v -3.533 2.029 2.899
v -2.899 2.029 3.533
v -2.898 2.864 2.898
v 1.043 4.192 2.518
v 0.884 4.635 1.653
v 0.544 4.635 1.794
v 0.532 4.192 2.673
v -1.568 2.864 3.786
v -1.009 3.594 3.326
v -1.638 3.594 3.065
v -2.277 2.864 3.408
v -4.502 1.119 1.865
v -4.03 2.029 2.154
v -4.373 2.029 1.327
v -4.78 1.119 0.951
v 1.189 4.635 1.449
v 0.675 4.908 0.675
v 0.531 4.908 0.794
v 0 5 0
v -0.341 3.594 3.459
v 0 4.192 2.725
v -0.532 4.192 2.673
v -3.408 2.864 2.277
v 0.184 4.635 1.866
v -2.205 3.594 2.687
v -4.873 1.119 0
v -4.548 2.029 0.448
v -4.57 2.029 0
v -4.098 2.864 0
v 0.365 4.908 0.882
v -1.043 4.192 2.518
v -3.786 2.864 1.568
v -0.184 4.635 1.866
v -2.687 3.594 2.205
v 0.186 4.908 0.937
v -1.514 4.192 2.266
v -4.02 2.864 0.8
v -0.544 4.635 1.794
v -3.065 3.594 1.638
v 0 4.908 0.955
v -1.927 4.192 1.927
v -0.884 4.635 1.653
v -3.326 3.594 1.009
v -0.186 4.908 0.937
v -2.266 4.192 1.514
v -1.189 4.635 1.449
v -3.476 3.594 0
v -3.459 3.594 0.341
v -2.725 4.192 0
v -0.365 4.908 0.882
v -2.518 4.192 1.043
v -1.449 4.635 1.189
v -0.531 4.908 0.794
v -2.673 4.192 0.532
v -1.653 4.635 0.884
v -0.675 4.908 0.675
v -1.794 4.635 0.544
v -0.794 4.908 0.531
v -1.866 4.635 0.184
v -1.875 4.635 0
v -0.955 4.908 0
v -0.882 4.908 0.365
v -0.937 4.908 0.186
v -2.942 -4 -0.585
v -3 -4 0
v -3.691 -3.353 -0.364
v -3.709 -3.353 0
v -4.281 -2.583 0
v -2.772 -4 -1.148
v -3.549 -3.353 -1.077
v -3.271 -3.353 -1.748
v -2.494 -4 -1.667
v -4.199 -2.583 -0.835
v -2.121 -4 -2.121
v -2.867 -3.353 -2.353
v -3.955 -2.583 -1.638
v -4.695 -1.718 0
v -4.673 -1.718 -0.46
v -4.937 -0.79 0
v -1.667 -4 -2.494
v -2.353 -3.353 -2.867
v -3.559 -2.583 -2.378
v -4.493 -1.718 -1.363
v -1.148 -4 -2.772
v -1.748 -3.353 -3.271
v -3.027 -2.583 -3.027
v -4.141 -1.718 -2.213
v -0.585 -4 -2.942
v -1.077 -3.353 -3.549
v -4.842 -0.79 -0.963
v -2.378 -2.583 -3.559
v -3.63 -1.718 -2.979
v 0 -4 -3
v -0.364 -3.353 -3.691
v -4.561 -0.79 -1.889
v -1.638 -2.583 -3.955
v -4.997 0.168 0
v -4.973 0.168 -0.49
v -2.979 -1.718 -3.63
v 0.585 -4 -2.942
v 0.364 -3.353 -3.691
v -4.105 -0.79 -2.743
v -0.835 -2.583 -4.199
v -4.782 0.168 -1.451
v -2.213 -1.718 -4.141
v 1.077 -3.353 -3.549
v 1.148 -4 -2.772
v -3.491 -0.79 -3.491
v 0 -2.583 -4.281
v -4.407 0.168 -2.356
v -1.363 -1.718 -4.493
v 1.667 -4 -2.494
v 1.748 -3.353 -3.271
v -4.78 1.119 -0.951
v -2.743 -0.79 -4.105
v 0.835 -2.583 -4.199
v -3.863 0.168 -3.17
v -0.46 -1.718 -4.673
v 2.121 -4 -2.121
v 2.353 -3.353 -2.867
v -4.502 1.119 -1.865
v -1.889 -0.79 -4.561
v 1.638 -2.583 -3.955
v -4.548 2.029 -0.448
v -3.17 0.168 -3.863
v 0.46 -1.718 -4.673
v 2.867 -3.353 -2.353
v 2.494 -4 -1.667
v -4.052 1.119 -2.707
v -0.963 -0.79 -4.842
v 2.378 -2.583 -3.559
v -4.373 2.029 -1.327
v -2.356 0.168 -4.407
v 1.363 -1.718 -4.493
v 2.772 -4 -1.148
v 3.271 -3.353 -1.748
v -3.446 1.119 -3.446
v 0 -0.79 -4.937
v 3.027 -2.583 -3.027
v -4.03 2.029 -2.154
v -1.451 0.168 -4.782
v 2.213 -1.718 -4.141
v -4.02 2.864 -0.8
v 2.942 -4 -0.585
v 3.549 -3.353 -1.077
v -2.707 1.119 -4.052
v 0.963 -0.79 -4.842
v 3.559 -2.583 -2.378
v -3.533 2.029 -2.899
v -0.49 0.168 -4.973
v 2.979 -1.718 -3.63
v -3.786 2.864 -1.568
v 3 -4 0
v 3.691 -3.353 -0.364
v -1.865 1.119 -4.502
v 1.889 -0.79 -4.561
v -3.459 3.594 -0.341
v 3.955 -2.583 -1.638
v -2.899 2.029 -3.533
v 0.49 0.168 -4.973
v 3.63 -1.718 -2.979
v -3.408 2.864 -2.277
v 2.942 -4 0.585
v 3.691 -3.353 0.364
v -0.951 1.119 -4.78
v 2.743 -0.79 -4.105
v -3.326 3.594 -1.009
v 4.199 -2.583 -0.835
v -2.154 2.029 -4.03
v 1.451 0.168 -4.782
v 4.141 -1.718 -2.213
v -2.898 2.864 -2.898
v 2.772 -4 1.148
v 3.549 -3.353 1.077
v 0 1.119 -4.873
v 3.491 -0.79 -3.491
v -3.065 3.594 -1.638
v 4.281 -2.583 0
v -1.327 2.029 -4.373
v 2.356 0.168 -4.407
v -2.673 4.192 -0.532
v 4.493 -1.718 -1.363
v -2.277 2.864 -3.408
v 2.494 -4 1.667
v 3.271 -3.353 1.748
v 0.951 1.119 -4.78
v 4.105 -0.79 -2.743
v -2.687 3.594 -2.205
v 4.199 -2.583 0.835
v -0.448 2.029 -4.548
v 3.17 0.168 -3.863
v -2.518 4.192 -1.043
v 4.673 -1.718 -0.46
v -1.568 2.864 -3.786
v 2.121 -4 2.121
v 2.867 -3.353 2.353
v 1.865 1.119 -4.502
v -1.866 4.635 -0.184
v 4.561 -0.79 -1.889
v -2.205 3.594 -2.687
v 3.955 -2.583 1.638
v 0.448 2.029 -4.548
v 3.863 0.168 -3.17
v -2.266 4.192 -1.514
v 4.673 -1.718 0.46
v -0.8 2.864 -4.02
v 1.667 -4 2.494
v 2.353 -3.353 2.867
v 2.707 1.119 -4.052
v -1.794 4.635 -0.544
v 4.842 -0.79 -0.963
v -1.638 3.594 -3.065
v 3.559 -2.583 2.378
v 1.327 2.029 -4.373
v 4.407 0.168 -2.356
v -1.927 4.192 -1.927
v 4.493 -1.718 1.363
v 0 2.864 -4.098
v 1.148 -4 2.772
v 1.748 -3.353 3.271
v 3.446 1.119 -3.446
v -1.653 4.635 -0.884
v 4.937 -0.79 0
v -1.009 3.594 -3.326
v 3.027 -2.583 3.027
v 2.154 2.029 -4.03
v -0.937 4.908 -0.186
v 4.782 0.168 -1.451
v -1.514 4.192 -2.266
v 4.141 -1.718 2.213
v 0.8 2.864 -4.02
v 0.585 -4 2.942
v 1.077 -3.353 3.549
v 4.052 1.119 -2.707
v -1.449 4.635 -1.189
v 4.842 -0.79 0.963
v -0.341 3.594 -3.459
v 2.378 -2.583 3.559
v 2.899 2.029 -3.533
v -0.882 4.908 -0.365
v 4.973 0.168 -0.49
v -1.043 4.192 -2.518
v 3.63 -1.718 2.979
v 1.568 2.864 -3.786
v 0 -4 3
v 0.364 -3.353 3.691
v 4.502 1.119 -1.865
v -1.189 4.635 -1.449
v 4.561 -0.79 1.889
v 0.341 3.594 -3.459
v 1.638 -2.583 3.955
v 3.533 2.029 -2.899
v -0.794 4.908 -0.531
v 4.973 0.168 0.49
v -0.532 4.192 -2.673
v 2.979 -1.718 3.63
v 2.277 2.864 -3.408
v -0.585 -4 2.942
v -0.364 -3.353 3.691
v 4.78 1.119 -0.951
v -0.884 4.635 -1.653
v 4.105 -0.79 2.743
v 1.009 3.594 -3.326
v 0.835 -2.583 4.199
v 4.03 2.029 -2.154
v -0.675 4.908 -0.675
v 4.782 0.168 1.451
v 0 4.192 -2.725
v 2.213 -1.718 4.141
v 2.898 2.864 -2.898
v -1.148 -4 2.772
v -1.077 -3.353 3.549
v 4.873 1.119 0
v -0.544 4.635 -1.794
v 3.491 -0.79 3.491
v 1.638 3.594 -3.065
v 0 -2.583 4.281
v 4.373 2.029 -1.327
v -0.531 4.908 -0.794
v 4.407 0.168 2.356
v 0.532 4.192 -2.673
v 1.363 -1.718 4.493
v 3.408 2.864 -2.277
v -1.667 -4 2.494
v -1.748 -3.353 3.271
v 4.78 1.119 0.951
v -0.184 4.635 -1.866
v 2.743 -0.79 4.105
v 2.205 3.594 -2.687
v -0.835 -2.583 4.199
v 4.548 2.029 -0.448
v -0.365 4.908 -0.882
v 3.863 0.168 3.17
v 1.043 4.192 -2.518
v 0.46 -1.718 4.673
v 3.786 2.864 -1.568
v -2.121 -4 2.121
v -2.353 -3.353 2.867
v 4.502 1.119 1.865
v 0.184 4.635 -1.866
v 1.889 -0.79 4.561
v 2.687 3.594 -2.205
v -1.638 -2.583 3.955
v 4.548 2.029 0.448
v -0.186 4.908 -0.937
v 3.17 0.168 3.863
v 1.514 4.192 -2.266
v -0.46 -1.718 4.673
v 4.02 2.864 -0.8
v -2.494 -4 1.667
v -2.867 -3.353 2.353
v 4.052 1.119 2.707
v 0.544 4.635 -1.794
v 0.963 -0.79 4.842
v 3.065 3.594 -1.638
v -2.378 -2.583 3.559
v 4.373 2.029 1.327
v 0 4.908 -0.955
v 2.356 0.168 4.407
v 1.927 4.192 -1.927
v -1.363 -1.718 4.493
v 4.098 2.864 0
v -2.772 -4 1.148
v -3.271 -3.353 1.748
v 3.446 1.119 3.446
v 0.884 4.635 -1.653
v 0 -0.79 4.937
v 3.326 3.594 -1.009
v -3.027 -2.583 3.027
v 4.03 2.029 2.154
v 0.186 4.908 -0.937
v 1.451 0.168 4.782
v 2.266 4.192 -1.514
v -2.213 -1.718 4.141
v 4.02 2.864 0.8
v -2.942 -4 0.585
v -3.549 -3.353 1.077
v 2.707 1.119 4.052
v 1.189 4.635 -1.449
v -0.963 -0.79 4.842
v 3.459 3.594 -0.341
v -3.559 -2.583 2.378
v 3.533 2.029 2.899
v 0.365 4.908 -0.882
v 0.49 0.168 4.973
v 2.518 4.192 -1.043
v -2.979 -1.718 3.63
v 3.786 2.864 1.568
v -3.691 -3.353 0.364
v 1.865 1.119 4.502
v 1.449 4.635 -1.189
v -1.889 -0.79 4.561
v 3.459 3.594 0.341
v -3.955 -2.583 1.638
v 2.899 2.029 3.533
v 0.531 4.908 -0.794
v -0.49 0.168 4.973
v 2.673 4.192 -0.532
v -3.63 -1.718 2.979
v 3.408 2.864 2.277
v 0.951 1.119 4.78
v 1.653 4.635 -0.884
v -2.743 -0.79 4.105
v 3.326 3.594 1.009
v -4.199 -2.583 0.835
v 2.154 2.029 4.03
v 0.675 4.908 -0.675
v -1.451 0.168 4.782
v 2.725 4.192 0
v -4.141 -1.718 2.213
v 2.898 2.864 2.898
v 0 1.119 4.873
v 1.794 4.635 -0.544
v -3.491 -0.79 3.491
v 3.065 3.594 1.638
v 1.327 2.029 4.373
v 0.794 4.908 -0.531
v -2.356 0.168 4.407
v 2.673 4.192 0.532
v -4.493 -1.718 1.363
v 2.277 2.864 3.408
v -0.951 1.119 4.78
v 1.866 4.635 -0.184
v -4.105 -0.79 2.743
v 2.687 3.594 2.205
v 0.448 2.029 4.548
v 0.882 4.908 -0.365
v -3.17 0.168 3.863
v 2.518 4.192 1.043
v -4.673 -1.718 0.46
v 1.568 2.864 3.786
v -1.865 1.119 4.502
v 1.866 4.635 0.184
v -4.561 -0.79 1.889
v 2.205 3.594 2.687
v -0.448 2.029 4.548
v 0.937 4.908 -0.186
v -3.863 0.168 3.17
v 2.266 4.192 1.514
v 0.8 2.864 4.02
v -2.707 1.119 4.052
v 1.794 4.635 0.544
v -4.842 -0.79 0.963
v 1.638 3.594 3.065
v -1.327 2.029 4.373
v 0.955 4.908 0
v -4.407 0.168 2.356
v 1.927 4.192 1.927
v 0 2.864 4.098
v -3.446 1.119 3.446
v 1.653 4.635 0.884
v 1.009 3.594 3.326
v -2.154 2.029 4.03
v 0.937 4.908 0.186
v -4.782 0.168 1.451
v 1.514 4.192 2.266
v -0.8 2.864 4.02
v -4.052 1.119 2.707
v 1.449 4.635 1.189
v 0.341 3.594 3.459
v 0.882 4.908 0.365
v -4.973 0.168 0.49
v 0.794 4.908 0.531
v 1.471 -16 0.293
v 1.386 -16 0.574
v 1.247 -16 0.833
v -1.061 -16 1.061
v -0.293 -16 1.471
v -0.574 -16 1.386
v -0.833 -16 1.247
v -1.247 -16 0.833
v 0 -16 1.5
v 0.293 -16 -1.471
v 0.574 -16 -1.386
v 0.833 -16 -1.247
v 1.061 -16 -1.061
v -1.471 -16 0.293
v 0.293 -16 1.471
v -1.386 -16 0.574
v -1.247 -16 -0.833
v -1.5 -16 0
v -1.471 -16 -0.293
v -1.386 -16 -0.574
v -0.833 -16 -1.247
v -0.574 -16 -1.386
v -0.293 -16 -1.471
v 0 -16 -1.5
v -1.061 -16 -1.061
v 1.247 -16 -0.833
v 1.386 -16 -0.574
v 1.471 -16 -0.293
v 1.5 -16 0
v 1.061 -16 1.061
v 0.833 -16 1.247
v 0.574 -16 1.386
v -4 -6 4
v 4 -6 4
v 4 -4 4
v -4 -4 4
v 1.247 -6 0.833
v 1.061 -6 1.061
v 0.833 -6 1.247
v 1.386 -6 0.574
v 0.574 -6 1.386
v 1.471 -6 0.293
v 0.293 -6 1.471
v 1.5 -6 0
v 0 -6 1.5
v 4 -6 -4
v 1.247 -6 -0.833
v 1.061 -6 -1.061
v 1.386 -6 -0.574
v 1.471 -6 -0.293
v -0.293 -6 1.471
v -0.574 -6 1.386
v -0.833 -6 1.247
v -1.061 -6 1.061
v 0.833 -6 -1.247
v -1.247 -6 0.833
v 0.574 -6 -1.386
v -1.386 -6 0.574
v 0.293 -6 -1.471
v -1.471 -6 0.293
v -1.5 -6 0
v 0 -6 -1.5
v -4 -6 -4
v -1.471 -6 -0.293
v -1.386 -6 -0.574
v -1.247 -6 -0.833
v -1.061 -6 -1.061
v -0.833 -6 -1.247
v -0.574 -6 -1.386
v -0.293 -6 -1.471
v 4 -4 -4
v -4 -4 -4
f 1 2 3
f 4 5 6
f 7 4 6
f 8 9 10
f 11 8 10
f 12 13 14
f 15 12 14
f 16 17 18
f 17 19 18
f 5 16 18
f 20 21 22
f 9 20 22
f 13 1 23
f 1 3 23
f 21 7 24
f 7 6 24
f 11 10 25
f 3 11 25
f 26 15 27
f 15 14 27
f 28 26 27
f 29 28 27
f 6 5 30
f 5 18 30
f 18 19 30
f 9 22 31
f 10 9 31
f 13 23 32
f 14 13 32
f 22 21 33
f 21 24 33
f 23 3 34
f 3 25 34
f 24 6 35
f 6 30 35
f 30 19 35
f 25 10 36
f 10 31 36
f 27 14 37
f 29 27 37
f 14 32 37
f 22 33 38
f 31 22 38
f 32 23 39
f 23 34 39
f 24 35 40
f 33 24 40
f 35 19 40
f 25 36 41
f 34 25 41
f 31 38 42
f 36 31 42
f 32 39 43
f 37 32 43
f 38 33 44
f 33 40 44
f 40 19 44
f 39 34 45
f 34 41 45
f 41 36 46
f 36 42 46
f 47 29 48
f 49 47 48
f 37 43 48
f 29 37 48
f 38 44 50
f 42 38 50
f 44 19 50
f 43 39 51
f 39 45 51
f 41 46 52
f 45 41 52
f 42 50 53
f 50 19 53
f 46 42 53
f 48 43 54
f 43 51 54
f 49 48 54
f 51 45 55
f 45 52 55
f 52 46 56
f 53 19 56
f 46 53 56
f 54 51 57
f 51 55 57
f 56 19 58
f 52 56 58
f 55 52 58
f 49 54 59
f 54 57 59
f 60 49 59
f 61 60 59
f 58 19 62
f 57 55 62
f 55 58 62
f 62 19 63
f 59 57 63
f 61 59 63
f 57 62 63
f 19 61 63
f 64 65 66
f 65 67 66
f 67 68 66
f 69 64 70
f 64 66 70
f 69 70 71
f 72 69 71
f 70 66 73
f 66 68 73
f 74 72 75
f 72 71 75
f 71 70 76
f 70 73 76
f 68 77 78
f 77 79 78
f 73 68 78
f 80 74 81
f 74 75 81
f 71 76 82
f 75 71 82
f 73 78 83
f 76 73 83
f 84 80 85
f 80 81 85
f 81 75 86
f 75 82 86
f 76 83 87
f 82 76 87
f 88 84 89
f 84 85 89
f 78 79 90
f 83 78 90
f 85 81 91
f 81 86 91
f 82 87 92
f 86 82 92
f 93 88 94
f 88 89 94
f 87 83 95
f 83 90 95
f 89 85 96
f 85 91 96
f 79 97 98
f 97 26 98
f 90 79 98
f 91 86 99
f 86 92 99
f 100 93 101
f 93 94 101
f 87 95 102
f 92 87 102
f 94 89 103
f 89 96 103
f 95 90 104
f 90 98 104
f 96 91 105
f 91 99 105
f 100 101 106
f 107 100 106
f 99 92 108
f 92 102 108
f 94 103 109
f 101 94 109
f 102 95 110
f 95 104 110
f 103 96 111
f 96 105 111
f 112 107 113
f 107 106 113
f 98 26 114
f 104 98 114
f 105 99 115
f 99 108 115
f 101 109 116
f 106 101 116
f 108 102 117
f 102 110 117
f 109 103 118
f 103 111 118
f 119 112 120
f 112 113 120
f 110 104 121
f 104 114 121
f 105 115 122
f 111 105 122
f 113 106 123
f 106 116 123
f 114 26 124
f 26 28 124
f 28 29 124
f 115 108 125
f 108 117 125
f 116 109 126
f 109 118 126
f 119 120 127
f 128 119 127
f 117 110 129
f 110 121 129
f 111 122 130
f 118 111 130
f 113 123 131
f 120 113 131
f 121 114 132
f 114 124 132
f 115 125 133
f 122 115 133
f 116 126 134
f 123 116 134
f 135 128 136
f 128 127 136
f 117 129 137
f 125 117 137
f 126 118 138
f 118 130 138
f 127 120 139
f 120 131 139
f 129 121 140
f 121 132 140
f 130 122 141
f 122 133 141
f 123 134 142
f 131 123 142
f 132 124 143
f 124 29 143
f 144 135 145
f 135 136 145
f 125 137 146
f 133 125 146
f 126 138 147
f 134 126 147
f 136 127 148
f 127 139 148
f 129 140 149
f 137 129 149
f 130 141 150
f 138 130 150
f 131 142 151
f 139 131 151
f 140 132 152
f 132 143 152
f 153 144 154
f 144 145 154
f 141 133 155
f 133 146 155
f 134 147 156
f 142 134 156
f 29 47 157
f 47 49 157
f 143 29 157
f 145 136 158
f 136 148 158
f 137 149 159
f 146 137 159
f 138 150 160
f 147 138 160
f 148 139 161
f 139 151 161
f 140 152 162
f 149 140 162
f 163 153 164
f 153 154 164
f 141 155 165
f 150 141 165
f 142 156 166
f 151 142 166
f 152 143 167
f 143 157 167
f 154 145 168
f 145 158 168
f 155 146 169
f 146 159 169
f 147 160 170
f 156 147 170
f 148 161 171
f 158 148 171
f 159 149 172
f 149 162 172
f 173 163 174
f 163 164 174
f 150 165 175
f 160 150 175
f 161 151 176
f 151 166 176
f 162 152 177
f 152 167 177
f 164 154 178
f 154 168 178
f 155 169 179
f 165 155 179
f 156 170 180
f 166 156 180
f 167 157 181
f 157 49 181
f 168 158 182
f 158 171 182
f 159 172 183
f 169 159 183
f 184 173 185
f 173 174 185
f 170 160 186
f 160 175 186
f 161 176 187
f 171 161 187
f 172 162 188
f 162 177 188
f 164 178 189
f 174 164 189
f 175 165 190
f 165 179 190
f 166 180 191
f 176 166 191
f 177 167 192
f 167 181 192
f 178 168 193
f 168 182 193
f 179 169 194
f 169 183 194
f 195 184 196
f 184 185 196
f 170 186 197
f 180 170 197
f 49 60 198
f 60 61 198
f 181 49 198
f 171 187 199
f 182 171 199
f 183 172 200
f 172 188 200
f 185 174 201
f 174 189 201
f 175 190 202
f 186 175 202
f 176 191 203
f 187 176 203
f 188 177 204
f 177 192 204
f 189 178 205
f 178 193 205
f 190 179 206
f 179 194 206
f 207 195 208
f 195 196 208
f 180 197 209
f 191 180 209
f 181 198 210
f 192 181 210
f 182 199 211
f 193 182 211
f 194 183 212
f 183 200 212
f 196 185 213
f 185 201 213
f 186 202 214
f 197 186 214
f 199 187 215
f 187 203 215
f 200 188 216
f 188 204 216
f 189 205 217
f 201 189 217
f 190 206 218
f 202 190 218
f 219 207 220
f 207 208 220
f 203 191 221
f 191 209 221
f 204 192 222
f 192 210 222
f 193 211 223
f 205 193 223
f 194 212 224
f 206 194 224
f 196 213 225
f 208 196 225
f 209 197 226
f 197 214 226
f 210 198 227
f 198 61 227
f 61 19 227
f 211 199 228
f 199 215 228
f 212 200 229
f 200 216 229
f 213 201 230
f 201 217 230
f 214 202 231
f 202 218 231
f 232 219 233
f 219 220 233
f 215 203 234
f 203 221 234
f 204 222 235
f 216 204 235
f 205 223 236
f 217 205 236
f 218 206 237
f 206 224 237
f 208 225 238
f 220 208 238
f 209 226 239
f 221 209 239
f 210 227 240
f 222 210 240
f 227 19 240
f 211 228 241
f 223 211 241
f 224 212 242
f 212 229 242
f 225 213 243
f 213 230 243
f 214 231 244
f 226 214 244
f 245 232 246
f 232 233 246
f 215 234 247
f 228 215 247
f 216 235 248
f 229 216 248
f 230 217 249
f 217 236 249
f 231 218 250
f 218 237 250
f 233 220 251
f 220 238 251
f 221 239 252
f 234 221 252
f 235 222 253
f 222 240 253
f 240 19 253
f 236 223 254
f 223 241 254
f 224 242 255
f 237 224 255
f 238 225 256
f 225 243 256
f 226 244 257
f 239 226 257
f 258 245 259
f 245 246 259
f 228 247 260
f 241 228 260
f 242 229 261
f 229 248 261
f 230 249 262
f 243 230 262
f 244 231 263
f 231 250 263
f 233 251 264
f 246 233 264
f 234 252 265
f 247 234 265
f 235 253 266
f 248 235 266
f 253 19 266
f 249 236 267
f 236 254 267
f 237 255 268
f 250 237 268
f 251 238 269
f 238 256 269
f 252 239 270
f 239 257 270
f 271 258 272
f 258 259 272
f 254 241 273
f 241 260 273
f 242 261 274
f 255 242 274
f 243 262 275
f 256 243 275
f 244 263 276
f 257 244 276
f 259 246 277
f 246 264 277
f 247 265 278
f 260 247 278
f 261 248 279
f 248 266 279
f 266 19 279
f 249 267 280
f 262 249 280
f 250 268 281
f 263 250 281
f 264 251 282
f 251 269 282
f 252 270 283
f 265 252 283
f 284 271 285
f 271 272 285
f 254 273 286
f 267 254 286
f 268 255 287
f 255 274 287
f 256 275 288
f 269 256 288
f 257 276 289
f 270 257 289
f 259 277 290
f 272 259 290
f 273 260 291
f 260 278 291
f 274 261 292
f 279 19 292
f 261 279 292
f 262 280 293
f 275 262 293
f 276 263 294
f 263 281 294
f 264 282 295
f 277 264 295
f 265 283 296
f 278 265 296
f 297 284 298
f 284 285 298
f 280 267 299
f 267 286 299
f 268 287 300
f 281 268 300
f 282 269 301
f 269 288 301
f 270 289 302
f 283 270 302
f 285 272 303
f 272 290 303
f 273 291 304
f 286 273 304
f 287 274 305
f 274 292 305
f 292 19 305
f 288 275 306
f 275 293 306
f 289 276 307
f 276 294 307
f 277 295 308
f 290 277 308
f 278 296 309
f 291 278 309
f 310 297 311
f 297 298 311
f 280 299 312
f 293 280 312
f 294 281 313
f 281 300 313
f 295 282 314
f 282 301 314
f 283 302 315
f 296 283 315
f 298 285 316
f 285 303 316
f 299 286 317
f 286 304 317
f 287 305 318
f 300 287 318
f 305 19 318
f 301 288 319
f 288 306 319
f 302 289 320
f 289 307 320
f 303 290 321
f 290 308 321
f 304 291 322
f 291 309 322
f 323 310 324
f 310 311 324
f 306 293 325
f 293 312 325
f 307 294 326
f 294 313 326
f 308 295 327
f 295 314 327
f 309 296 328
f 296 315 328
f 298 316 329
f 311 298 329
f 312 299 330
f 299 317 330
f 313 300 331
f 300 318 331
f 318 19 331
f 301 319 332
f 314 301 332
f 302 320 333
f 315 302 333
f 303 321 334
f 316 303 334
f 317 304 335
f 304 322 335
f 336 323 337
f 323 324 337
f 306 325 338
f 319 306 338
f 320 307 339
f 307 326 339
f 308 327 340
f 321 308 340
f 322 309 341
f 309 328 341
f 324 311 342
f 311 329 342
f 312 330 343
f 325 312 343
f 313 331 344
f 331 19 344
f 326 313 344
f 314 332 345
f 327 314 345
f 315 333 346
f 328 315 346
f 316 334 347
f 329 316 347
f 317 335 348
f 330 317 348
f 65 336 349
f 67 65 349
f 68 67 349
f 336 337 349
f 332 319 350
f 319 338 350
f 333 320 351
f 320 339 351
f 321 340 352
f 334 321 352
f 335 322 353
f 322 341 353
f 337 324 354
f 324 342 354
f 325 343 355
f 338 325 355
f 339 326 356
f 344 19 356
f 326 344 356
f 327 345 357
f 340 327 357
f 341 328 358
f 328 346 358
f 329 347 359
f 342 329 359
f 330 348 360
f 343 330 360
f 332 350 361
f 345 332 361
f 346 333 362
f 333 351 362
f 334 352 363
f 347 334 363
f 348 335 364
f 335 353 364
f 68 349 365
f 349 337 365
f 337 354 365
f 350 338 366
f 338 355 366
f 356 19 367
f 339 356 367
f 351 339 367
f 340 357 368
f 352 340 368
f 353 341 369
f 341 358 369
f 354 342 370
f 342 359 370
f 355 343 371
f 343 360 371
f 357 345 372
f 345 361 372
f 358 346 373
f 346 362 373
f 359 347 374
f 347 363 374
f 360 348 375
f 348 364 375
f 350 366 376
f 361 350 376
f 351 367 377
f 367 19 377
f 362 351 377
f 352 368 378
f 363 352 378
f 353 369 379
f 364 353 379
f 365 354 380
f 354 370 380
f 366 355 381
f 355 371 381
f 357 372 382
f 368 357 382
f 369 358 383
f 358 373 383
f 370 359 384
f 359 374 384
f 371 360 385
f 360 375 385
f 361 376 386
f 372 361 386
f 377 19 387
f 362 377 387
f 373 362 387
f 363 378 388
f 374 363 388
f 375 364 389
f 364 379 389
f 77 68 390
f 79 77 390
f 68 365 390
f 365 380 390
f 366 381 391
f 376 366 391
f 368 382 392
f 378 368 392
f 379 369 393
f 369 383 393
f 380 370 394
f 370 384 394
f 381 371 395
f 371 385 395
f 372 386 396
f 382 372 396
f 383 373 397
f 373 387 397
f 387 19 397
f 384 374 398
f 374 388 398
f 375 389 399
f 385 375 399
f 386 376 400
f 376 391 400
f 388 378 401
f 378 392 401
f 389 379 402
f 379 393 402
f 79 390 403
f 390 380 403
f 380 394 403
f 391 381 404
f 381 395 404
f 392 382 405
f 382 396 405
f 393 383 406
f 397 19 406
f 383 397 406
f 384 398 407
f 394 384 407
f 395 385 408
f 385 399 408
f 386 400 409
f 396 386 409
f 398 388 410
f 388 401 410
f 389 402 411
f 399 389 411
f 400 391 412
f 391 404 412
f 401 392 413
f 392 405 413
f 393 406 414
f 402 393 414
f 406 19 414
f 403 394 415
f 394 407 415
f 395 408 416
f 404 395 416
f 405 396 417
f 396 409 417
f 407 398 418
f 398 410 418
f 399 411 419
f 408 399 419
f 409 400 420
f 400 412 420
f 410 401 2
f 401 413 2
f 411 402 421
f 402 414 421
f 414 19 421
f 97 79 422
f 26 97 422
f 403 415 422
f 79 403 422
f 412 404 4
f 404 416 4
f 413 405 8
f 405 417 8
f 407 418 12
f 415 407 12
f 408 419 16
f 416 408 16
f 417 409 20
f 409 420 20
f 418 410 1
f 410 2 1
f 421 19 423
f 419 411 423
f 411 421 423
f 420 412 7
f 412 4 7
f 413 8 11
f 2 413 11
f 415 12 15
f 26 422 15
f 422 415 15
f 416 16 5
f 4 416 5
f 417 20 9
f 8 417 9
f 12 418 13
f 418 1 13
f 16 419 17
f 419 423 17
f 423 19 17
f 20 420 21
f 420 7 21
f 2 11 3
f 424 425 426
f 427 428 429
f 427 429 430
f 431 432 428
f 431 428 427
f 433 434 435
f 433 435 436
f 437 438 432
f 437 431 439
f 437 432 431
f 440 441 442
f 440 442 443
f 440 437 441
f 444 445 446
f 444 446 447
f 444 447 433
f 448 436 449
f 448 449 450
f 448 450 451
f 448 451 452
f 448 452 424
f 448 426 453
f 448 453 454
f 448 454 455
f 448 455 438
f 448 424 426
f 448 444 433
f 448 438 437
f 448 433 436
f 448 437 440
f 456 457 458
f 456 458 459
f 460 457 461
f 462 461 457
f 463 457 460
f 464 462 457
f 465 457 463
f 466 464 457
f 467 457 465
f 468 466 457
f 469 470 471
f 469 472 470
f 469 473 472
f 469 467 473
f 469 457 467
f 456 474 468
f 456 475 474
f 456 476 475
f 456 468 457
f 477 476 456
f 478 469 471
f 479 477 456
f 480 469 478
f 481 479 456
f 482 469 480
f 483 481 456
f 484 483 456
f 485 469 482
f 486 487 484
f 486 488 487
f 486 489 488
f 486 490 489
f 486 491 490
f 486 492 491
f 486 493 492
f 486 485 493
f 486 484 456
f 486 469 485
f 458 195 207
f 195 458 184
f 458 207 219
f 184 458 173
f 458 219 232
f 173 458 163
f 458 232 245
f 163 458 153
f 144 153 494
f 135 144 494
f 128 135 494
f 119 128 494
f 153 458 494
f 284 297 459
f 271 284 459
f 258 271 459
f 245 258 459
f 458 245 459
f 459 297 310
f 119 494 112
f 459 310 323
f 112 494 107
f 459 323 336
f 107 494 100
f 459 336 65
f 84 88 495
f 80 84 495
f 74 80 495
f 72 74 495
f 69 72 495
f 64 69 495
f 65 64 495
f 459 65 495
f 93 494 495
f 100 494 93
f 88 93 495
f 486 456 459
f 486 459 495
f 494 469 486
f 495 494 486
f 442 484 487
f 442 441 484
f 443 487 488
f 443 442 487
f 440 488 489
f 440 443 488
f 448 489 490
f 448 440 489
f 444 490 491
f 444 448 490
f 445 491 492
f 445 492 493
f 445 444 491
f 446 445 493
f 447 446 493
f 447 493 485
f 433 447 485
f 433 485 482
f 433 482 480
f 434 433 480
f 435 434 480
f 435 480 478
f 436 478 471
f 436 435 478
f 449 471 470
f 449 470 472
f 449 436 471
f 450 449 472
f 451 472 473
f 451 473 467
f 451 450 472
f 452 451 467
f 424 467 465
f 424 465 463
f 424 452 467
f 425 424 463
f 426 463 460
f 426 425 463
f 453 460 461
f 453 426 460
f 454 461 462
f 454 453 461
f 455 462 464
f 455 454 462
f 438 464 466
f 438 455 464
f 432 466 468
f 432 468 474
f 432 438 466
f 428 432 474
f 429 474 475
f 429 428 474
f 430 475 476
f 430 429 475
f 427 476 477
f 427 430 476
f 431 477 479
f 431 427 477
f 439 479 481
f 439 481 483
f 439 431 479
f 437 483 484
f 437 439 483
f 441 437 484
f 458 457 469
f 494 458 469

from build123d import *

# Parameters (mm, degrees)
SKETCH1_W           = 1.5
SKETCH1_H           = 11
SKETCH2_W           = 8
SKETCH2_H           = 8
BOSS_EXTRUDE1_DEPTH = 2


with BuildPart() as part:
    # Sketch1 → Revolve1 (revolve)
    with BuildSketch(Plane.XY):
        with BuildLine():
            Line((0, -5), (-1.5, -5))
            Line((-1.5, -5), (-1.5, -4.769696007))
            ThreePointArc((-1.5, -4.769696007), (-4.942088629, 0.758788496), (0, 5))
            Line((0, 5), (0, -5))
        make_face()
        with Locations((-0.75, -10.5)):
            Rectangle(SKETCH1_W, SKETCH1_H)
    revolve(axis=Axis((0, 5, 0), (0, -1, 0)))

    # Sketch2 → Boss-Extrude1 (add)
    with BuildSketch(Plane(origin=(0, -6, 0), x_dir=(-1, 0, 0), z_dir=(0, -1, 0))):
        Rectangle(SKETCH2_W, SKETCH2_H)
    extrude(amount=-BOSS_EXTRUDE1_DEPTH)


solid = part.part
